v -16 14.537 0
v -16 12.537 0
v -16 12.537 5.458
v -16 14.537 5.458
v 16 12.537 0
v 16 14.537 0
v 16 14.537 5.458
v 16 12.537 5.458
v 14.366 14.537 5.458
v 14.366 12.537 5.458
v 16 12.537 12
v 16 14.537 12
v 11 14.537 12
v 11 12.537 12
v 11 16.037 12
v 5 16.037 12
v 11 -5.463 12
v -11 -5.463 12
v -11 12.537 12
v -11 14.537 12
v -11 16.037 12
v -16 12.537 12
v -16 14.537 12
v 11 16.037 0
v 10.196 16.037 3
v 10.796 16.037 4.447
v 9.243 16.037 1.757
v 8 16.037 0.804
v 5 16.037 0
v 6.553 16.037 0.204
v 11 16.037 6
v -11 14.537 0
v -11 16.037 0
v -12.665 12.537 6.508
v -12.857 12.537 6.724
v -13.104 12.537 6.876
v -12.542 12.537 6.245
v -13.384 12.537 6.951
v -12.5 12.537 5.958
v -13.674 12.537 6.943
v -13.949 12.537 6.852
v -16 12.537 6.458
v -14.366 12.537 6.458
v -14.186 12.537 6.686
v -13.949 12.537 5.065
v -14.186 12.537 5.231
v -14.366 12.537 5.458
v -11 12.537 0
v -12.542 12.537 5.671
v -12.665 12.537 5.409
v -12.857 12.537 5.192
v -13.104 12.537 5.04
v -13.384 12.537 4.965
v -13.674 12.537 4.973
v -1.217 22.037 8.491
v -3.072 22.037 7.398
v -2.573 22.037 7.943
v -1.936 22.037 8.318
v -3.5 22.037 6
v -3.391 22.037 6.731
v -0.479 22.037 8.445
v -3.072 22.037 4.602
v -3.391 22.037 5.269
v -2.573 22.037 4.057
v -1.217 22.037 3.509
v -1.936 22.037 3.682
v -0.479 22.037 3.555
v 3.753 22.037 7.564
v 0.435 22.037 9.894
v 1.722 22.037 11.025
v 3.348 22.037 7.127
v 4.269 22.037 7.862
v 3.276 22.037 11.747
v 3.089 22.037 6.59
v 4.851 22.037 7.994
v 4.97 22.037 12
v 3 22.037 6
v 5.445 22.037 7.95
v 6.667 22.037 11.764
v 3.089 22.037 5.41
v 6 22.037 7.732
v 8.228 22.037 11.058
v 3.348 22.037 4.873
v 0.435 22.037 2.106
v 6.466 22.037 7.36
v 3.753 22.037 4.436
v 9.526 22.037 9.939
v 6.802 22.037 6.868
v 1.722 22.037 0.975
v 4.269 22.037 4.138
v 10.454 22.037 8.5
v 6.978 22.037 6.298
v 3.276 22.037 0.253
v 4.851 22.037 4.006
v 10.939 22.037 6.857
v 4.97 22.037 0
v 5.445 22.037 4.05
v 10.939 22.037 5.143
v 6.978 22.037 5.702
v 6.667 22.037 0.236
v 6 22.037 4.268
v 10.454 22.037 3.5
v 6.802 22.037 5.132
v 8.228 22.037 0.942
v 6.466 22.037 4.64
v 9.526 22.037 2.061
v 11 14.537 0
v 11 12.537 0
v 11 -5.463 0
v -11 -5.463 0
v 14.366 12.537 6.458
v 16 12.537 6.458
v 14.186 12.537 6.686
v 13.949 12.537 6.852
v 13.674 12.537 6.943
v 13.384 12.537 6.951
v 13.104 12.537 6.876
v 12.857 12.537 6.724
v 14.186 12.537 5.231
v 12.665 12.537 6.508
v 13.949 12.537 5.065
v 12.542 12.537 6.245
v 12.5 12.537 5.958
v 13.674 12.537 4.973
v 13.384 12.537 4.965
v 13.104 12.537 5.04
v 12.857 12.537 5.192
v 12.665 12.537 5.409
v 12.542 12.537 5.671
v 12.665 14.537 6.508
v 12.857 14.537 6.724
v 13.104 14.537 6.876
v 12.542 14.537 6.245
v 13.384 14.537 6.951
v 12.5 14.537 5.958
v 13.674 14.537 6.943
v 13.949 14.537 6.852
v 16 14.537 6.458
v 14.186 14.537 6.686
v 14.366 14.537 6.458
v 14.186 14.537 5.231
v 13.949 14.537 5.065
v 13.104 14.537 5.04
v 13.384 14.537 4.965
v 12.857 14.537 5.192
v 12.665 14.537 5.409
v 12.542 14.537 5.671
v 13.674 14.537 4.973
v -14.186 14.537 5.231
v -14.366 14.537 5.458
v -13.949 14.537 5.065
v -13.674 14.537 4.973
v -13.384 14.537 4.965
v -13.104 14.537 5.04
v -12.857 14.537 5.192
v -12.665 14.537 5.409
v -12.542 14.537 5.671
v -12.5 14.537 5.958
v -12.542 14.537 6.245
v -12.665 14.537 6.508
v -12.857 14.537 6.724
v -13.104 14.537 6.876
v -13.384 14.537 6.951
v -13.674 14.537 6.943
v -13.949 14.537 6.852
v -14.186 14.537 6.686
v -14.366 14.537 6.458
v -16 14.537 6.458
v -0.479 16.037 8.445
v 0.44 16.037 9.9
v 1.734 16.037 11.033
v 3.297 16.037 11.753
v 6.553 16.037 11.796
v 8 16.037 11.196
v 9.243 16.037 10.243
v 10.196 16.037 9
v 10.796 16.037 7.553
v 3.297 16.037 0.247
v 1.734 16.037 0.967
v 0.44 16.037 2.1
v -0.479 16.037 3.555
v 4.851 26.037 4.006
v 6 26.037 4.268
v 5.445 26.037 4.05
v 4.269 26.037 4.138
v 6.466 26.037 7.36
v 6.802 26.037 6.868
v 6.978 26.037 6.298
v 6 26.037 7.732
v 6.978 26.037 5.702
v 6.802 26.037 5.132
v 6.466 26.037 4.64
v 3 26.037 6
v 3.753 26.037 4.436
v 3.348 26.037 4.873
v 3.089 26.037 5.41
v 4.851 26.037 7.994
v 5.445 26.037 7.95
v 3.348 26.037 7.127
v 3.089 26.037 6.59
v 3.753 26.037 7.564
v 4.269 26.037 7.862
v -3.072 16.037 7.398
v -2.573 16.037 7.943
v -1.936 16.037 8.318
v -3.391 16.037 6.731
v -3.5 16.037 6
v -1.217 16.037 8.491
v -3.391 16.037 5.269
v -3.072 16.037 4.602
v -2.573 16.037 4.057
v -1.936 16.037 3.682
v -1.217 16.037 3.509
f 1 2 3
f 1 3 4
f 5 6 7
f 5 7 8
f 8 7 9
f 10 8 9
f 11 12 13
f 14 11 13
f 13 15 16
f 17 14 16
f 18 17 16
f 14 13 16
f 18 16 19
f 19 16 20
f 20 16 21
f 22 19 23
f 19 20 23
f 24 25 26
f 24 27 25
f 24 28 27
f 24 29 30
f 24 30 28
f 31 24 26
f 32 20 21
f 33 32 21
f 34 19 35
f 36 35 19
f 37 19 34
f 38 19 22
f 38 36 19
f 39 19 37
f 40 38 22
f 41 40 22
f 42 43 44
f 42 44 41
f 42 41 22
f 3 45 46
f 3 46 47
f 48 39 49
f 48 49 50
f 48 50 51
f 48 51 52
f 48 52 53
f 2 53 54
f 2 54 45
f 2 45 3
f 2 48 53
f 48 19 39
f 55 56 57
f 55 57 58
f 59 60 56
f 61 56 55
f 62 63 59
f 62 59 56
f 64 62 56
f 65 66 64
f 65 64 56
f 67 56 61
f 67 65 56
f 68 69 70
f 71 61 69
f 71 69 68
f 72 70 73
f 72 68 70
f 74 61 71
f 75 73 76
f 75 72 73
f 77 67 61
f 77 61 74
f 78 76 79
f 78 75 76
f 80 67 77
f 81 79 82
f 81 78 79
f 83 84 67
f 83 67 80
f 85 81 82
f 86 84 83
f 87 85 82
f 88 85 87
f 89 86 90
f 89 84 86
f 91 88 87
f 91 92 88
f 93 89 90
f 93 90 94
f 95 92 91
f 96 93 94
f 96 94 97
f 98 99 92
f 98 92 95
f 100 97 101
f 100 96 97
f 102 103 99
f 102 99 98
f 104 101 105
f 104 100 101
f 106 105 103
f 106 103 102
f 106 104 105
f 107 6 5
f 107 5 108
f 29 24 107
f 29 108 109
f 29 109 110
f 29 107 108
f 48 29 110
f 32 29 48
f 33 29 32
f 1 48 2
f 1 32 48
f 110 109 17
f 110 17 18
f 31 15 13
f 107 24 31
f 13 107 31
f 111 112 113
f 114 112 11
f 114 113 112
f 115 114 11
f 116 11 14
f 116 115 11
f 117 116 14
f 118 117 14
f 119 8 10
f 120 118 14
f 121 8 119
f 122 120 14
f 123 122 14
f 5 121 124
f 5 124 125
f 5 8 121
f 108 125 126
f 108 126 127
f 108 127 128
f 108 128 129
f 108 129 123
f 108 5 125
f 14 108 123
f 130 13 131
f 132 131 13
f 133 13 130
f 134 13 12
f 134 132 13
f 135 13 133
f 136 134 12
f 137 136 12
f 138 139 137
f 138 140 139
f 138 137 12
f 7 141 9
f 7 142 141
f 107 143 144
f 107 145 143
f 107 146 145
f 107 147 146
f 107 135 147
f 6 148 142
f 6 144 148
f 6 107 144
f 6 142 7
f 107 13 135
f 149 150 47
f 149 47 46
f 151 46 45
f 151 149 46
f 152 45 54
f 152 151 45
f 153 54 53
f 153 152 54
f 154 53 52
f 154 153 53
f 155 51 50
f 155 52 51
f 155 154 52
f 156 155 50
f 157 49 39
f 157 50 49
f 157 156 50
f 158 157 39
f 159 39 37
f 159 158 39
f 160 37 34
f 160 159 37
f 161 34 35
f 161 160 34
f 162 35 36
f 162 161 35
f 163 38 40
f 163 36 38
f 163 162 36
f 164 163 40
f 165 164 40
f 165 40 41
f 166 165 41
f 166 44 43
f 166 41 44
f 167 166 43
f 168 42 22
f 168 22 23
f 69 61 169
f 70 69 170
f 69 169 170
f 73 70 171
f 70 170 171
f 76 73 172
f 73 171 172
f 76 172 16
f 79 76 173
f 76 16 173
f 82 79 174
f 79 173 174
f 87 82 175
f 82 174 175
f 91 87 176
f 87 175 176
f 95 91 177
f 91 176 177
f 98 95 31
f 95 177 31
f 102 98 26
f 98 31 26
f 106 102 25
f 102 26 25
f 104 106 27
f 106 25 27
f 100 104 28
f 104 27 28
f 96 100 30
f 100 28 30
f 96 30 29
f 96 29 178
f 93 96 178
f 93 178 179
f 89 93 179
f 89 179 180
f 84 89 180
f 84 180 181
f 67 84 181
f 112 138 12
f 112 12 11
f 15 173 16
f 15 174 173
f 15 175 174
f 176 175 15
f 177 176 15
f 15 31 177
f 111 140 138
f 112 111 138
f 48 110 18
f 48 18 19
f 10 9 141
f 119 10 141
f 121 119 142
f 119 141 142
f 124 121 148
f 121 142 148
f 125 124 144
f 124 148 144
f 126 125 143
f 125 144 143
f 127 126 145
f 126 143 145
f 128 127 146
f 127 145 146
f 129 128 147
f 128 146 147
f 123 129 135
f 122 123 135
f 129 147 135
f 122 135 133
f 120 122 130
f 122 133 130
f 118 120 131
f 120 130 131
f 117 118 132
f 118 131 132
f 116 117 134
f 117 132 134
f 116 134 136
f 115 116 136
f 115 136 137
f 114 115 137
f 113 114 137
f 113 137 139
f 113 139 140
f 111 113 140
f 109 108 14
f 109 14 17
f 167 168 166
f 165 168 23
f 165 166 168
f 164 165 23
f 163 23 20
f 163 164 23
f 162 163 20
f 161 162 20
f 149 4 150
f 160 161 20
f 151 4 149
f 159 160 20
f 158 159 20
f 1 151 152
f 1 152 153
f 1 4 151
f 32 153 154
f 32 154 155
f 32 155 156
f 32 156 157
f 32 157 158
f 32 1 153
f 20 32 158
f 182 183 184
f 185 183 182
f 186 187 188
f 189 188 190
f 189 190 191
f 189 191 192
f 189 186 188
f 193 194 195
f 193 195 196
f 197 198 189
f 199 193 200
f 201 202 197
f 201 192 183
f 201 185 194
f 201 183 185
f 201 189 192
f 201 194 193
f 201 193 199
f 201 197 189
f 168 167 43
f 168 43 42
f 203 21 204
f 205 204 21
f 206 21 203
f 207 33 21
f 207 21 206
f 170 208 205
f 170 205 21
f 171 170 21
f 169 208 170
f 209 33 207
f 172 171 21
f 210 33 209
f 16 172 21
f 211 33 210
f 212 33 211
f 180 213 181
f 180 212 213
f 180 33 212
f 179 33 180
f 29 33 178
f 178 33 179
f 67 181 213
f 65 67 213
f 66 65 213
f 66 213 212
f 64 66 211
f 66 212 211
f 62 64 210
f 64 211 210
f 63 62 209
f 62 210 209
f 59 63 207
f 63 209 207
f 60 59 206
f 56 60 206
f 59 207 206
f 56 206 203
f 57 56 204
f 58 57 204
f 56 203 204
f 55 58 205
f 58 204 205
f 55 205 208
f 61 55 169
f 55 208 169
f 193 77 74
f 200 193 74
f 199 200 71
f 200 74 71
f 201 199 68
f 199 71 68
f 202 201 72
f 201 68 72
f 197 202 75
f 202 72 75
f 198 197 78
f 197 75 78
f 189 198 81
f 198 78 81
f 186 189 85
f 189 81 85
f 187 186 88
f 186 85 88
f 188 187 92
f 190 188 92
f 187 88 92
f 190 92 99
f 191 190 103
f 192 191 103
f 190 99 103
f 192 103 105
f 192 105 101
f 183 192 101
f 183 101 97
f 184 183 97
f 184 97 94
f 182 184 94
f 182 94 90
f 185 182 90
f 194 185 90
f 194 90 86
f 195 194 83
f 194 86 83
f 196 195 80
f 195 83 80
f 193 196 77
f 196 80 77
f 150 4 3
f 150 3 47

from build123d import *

# Parameters (mm, degrees)
EXTRUDE_1_DEPTH     = 12
EXTRUDE_3_DEPTH     = 6
SKETCH_4_R          = 2
EXTRUDE_4_DEPTH     = 4
CUT_EXTRUDE_2_DEPTH = 29.284271247


with BuildPart() as part:
    # 草图1 → 凸台-拉伸1 (new body)
    with BuildSketch(Plane.XY):
        Polygon((-11, 12.536842105), (-16, 12.536842105), (-16, 14.536842105), (-11, 14.536842105), (-11, 16.036842105), (11, 16.036842105), (11, 14.536842105), (16, 14.536842105), (16, 12.536842105), (11, 12.536842105), (11, -5.463157895), (-11, -5.463157895), align=None)
    extrude(amount=EXTRUDE_1_DEPTH)

    # 草图2 → 凸台-拉伸3 (add)
    with BuildSketch(Plane(origin=(0, 16.036842105, 0), x_dir=(1, 0, 0), z_dir=(0, 1, 0))):
        with BuildLine():
            ThreePointArc((-0.479166667, -8.445144707), (11, -6), (-0.479166667, -3.554855293))
            ThreePointArc((-0.479166667, -3.554855293), (-3.5, -6), (-0.479166667, -8.445144707))
        make_face()
    extrude(amount=EXTRUDE_3_DEPTH)

    # 草图4 → 凸台-拉伸4 (add)
    with BuildSketch(Plane(origin=(0, 22.036842105, 0), x_dir=(1, 0, 0), z_dir=(0, 1, 0))):
        with Locations(Location((5, -6, 0), (0, 0, 180))):
            Circle(SKETCH_4_R)
    extrude(amount=EXTRUDE_4_DEPTH)

    # 草图5 → 切除-拉伸2 (cut, through all)
    with BuildSketch(Plane(origin=(0, 14.536842105, 0), x_dir=(-1, 0, 0), z_dir=(0, -1, 0))):
        with BuildLine():
            Line((-14.366025404, -6.458256145), (-16, -6.458256145))
            Line((-16, -6.458256145), (-16, -5.458256145))
            Line((-16, -5.458256145), (-14.366025404, -5.458256145))
            ThreePointArc((-14.366025404, -5.458256145), (-12.5, -5.958256145), (-14.366025404, -6.458256145))
        make_face()
        with BuildLine():
            Line((16, -6.458256145), (16, -5.458256145))
            Line((16, -5.458256145), (14.366025404, -5.458256145))
            ThreePointArc((14.366025404, -5.458256145), (12.5, -5.958256145), (14.366025404, -6.458256145))
            Line((14.366025404, -6.458256145), (16, -6.458256145))
        make_face()
    extrude(amount=CUT_EXTRUDE_2_DEPTH, mode=Mode.SUBTRACT)


solid = part.part
